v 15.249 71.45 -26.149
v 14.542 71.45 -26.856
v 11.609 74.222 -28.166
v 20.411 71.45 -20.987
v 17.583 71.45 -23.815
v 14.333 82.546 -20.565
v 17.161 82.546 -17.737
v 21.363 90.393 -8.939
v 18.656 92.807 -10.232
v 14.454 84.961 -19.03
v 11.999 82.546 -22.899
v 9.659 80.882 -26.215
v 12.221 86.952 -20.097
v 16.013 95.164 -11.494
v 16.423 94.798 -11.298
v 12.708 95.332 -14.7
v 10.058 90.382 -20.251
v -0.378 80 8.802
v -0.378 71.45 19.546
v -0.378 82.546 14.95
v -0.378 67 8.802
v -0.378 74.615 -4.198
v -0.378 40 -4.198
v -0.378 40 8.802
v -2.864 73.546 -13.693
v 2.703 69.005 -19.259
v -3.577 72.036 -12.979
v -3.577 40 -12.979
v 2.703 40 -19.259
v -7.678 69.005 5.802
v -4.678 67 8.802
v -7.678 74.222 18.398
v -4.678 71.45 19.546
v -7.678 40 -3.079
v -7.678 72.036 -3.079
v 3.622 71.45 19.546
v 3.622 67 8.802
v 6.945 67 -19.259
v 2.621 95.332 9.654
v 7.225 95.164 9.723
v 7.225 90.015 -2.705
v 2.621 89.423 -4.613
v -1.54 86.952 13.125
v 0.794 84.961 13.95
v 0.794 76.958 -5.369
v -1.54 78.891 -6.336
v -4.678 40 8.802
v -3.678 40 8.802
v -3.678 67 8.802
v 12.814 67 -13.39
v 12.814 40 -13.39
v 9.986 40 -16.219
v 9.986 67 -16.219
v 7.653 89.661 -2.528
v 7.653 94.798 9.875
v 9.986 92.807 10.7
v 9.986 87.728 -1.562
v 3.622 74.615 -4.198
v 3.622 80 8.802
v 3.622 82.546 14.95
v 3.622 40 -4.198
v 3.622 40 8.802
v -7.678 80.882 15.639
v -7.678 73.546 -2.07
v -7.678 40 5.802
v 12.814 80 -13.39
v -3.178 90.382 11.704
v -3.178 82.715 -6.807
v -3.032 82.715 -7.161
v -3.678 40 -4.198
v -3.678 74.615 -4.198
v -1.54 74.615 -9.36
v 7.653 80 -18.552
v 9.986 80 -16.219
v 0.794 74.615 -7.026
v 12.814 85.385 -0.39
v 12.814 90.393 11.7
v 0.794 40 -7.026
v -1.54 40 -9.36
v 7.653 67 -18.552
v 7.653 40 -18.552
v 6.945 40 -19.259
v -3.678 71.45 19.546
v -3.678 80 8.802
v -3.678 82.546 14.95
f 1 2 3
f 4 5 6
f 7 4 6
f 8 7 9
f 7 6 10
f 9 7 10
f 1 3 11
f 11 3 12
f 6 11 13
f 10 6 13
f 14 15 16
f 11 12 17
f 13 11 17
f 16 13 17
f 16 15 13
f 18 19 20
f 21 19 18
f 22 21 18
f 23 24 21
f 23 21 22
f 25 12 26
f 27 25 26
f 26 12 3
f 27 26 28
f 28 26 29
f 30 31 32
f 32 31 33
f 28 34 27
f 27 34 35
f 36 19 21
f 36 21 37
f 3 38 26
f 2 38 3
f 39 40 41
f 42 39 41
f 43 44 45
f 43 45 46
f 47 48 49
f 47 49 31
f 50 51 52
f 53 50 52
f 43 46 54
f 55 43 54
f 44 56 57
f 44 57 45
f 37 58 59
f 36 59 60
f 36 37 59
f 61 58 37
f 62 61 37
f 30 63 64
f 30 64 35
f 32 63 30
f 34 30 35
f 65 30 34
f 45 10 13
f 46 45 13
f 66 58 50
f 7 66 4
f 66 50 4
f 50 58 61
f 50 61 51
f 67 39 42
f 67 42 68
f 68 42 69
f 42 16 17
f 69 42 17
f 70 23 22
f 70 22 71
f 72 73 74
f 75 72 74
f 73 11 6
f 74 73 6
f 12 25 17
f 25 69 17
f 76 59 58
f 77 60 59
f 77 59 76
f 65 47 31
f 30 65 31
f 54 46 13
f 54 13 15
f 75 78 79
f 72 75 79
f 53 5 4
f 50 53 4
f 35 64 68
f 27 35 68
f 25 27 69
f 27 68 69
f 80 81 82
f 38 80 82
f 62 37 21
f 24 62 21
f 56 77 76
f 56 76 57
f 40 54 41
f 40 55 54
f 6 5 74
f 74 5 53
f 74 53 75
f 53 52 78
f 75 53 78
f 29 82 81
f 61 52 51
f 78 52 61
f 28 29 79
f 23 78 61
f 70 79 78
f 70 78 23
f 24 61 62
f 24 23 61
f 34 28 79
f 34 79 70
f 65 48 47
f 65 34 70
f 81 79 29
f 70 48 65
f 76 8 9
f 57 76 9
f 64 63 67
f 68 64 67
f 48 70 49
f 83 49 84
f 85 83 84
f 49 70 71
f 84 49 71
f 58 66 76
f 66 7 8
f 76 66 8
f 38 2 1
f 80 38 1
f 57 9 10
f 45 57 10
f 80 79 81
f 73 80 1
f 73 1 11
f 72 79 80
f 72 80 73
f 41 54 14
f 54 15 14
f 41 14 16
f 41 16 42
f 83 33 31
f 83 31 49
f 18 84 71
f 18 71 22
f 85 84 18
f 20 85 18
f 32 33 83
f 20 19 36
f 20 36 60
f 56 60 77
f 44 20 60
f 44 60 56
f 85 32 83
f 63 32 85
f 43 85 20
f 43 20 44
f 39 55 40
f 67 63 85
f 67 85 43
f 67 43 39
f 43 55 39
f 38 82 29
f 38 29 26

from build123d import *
from OCP.BRepFilletAPI import BRepFilletAPI_MakeChamfer

# Parameters (mm, degrees)
BOSS_EXTRUDE1_DEPTH = 80
CUT_EXTRUDE2_DEPTH  = 82.280481137
SKETCH6_W           = 4
SKETCH6_H           = 13
BOSS_EXTRUDE6_DEPTH = 70
BOSS_EXTRUDE7_REACH = 148.366
BOSS_EXTRUDE8_REACH = 152.403
CUT_EXTRUDE3_DEPTH  = 146.557626962
CUT_EXTRUDE4_DEPTH  = 142.8119282
CHAMFER3_START      = -30
CHAMFER3_OUTLINE_W  = 24
CHAMFER3_OUTLINE_H  = 27
CHAMFER3_DEPTH      = 4.140431355
CHAMFER4_START      = -11
CHAMFER4_OUTLINE_W  = 75
CHAMFER4_OUTLINE_H  = 14
CHAMFER4_DEPTH      = 2.728063486
CHAMFER5_START      = -38
CHAMFER5_OUTLINE_W  = 21
CHAMFER5_OUTLINE_H  = 26
CHAMFER5_DEPTH      = 3.409757195
CHAMFER7_SIZE       = 3
CHAMFER7_SIZE2      = 3.268453219
CHAMFER8_START      = -40
CHAMFER8_DEPTH      = 3.210737533
SKETCH20_W          = 40
SKETCH20_H          = 40
CUT_EXTRUDE5_DEPTH  = 103.734976835


with BuildPart() as part:
    # Sketch1 → Boss-Extrude1 (new body)
    with BuildSketch(Plane(origin=(0, 0, 0), x_dir=(1, 0, 0), z_dir=(0, 1, 0))):
        Polygon((3.622068507, 4.197822071), (3.622068507, -8.802177929), (-0.377931493, -8.802177929), (-0.377931493, 4.197822071), (-3.677931493, 4.197822071), (-3.677931493, -8.802177929), (-7.677931493, -8.802177929), (-7.677931493, 8.878435326), align=None)
    extrude(amount=BOSS_EXTRUDE1_DEPTH)

    # Sketch2 → Cut-Extrude2 (cut, through all)
    with BuildSketch(Plane.ZY.offset(7.677931493)):
        Polygon((8.802177929, 80), (-8.878435326, 80), (-8.878435326, 72.676450199), align=None)
    extrude(amount=-CUT_EXTRUDE2_DEPTH, mode=Mode.SUBTRACT)

    # Sketch6 → Boss-Extrude6 (add, along a direction that is not the sketch's normal)
    with BuildSketch(Plane.XY.offset(8.802177929)):
        with Locations((-5.677931493, 73.5)):
            Rectangle(SKETCH6_W, SKETCH6_H)
        with Locations((1.622068507, 73.5)):
            Rectangle(SKETCH6_W, SKETCH6_H)
    extrude(amount=BOSS_EXTRUDE6_DEPTH, dir=(0, 0.3826834323650841, 0.9238795325112892))

    # Boss-Extrude7: up to this plane
    boss_extrude7_end = Plane(origin=(3.622068507, 80, -4.197822071), z_dir=(-0.3826834323650841, 0, 0.9238795325112892))
    # Sketch7 → Boss-Extrude7 (add, up to the surface)
    with BuildSketch(Plane.XY.offset(73.473745205), mode=Mode.PRIVATE) as boss_extrude7_sk1:
        Polygon((-7.677931493, 106.787840266), (3.622068507, 106.787840266), (-7.677931493, 111.46845352), align=None)
    boss_extrude7_tool1 = split(extrude(boss_extrude7_sk1.sketch, amount=BOSS_EXTRUDE7_REACH, dir=(0, -0.382683432365, -0.923879532511), mode=Mode.PRIVATE), bisect_by=boss_extrude7_end, keep=Keep.BOTH, mode=Mode.PRIVATE)
    add(boss_extrude7_tool1.solids().sort_by_distance((-3.911265, 108.348045, 73.473745))[0])

    # Boss-Extrude8: up to this plane
    boss_extrude8_end = Plane(origin=(3.622068507, 80, -4.197822071), z_dir=(-0.3826834323650841, 0, 0.9238795325112892))
    # Sketch16 → Boss-Extrude8 (add, up to the surface)
    with BuildSketch(Plane.XY.offset(73.473745205), mode=Mode.PRIVATE) as boss_extrude8_sk1:
        Polygon((3.622068507, 106.787840266), (12.814456663, 115.980228421), (9.986029538, 118.808655546), (0.793641383, 109.61626739), (-1.539810995, 111.949719768), (7.65257716, 121.142107924), (4.824150035, 123.970535048), (-7.677931493, 111.46845352), align=None)
    boss_extrude8_tool1 = split(extrude(boss_extrude8_sk1.sketch, amount=BOSS_EXTRUDE8_REACH, dir=(0, -0.382683432365, -0.923879532511), mode=Mode.PRIVATE), bisect_by=boss_extrude8_end, keep=Keep.BOTH, mode=Mode.PRIVATE)
    add(boss_extrude8_tool1.solids().sort_by_distance((8.029162, 111.573135, 73.473745))[0])

    # Sketch17 → Cut-Extrude3 (cut, through all)
    with BuildSketch(Plane.ZY.offset(7.677931493)):
        Polygon((73.473745205, 93.787840266), (58.313175353, 130.388693616), (73.473745205, 136.668407262), align=None)
    extrude(amount=-CUT_EXTRUDE3_DEPTH, mode=Mode.SUBTRACT)

    # Sketch19 → Cut-Extrude4 (cut, through all)
    with BuildSketch(Plane.ZY.offset(7.677931493)):
        Polygon((73.473745205, 93.787840266), (19.545714219, 71.450118439), (5.092625448, 106.342961367), (59.020656435, 128.680683193), align=None)
    extrude(amount=-CUT_EXTRUDE4_DEPTH, mode=Mode.SUBTRACT)

    # Mirror9: part across plane


with BuildPart() as part_1:
    add(part.part)
    add(part.part.mirror(Plane(origin=(2.014593878, 0, -4.863659863), x_dir=(0.9238795325112891, 0, 0.3826834323650842), z_dir=(0.3826834323650841, 0, -0.9238795325112892))))

    # Chamfer3: read off the stored shape, not the designer's step
    # Chamfer3 outline → Chamfer3 (cut)
    with BuildSketch(Plane(origin=(0, 0, 0), x_dir=(0.4459030144065531, 0.4972805165228299, -0.7442328866893325), z_dir=(0.8950812821990801, -0.24773044161799307, 0.3707548065131521)).offset(CHAMFER3_START)):
        with Locations((45, 59.5)):
            Rectangle(CHAMFER3_OUTLINE_W, CHAMFER3_OUTLINE_H)
    extrude(amount=CHAMFER3_DEPTH, mode=Mode.SUBTRACT)

    # Chamfer4: read off the stored shape, not the designer's step
    # Chamfer4 outline → Chamfer4 (cut)
    with BuildSketch(Plane(origin=(0, 0, 0), x_dir=(0, 1, 0), z_dir=(0.9238795325112892, 0, 0.3826834323650841)).offset(CHAMFER4_START)):
        with Locations((36.5, -5)):
            Rectangle(CHAMFER4_OUTLINE_W, CHAMFER4_OUTLINE_H)
    extrude(amount=CHAMFER4_DEPTH, mode=Mode.SUBTRACT)

    # Chamfer5: read off the stored shape, not the designer's step
    # Chamfer5 outline → Chamfer5 (cut)
    with BuildSketch(Plane(origin=(0, 0, 0), x_dir=(0.3652745046018862, 0.9288881868246626, 0.061165943673236425), z_dir=(0.9161327263409628, -0.37036027915745895, 0.15340825059130198)).offset(CHAMFER5_START)):
        with Locations((74.5, 5)):
            Rectangle(CHAMFER5_OUTLINE_W, CHAMFER5_OUTLINE_H)
    extrude(amount=CHAMFER5_DEPTH, mode=Mode.SUBTRACT)

    # Chamfer7: one chamfer whose edges measure the first distance from different faces: ONE call of the kernel's chamfer builder (chamfer() names one face for all edges)
    chamfer7_edges_1 = [part_1.edges().sort_by_distance(p)[0] for p in [
        (-7.677931493, 69.225059219, 14.173946074),
        (8.622563718, 69.225059219, -25.178930536),
        (4.824150035, 33.5, -21.380516854),
        (-7.677931493, 33.5, 8.802177929),
    ]]
    chamfer7_edges_2 = [part_1.edges().sort_by_distance(p)[0] for p in [
        (9.269880183, 94.608411482, -8.145633747),
        (4.824150035, 94.608411482, 2.587308271),
    ]]
    chamfer7_side_2 = [part_1.faces().sort_by_distance(p)[0] for p in [
        (3.501171082, 89.374799079, -6.853796043),
    ]]
    chamfer7 = BRepFilletAPI_MakeChamfer(part_1.part.solid().wrapped)
    for e in chamfer7_edges_1:
        chamfer7.Add(CHAMFER7_SIZE, e.wrapped)
    for e in chamfer7_edges_2:
        chamfer7.Add(CHAMFER7_SIZE, CHAMFER7_SIZE2, e.wrapped, chamfer7_side_2[0].wrapped)  # the first distance lies on this face
    add(Compound.cast(chamfer7.Shape()), mode=Mode.REPLACE)

    # Chamfer8: read off the stored shape, not the designer's step
    # Chamfer8 outline → Chamfer8 (cut)
    with BuildSketch(Plane(origin=(0, 0, 0), x_dir=(0.6542484614665716, 0.42811862617005, -0.6234367590982206), z_dir=(0.7562796775456972, -0.37036027915745917, 0.5393276489795283)).offset(CHAMFER8_START)):
        Polygon((57.189510074, 50), (58.060381385, 66), (36, 66), (36, 50), align=None)
    extrude(amount=CHAMFER8_DEPTH, mode=Mode.SUBTRACT)

    # Sketch20 → Cut-Extrude5 (cut, through all)
    with BuildSketch(Plane(origin=(-7.642272839, 0, -3.165533057), x_dir=(-0.3826834323650836, 0, 0.9238795325112894), z_dir=(-0.9238795325112893, 0, -0.38268343236508356))):
        with Locations((-6.292508137, 20)):
            Rectangle(SKETCH20_W, SKETCH20_H)
    extrude(amount=-CUT_EXTRUDE5_DEPTH, mode=Mode.SUBTRACT)


solid = part_1.part
